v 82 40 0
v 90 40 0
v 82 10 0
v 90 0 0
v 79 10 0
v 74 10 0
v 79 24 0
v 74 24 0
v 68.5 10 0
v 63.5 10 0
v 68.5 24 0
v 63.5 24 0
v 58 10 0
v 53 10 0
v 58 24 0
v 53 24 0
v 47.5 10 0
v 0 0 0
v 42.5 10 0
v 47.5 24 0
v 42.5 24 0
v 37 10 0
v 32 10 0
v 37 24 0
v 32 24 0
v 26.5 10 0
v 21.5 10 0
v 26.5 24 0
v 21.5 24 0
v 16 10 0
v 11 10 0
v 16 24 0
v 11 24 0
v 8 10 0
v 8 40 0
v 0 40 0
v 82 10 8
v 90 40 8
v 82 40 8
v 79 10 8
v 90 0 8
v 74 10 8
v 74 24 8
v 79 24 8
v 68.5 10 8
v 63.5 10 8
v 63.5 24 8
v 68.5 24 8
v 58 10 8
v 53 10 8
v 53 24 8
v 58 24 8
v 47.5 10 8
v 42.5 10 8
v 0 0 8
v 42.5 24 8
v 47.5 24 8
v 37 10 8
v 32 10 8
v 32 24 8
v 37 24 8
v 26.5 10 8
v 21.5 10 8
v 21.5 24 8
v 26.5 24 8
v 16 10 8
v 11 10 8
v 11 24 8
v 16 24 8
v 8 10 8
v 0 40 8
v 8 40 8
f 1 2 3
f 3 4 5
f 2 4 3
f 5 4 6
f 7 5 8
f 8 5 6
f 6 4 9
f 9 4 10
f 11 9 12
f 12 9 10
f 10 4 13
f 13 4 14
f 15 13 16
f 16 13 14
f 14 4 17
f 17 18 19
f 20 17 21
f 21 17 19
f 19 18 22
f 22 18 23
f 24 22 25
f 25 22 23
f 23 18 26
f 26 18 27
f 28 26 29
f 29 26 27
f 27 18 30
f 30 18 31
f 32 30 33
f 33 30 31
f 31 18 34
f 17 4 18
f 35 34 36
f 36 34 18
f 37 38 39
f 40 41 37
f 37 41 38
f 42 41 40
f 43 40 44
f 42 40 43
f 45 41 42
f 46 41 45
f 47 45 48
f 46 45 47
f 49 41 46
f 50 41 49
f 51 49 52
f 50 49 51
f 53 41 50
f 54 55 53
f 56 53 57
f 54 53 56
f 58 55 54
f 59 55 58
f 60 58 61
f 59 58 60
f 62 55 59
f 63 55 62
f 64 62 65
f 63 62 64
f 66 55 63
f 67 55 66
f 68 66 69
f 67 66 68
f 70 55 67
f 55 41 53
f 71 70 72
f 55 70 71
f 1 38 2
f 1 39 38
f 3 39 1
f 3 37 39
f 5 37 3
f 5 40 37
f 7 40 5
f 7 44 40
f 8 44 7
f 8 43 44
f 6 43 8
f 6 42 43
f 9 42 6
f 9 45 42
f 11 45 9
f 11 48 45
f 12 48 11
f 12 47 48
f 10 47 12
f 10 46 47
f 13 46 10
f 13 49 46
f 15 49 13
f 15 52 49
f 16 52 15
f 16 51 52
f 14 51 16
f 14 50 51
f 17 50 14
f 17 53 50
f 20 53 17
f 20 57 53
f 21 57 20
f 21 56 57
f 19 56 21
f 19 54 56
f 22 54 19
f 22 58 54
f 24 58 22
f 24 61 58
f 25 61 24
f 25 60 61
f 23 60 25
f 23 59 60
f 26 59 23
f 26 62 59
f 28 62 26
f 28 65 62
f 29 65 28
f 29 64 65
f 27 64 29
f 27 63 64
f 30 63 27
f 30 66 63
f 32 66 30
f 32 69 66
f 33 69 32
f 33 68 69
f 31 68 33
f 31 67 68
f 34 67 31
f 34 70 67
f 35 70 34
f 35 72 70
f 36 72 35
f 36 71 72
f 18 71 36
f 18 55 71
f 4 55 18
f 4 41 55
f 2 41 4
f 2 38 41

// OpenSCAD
$fn = 32;

// ----------------------------------------------------------------------
// Guard grille: 7 slats over a 90 x 40 mm plate
// ----------------------------------------------------------------------

// --- parameters (mm) ---
profile_height = 8;       // extrusion height
profile_points = 36;      // points of the closed outline

profile = [[0, 0], [90, 0], [90, 40], [82, 40], [82, 10], [79, 10], [79, 24], [74, 24], [74, 10], [68.5, 10], [68.5, 24], [63.5, 24], [63.5, 10], [58, 10], [58, 24], [53, 24], [53, 10], [47.5, 10], [47.5, 24], [42.5, 24], [42.5, 10], [37, 10], [37, 24], [32, 24], [32, 10], [26.5, 10], [26.5, 24], [21.5, 24], [21.5, 10], [16, 10], [16, 24], [11, 24], [11, 10], [8, 10], [8, 40], [0, 40]];  // single closed polygon, 36 points, counter clockwise

// --- the one profile operation ---
linear_extrude(height = profile_height) polygon(points = profile);
